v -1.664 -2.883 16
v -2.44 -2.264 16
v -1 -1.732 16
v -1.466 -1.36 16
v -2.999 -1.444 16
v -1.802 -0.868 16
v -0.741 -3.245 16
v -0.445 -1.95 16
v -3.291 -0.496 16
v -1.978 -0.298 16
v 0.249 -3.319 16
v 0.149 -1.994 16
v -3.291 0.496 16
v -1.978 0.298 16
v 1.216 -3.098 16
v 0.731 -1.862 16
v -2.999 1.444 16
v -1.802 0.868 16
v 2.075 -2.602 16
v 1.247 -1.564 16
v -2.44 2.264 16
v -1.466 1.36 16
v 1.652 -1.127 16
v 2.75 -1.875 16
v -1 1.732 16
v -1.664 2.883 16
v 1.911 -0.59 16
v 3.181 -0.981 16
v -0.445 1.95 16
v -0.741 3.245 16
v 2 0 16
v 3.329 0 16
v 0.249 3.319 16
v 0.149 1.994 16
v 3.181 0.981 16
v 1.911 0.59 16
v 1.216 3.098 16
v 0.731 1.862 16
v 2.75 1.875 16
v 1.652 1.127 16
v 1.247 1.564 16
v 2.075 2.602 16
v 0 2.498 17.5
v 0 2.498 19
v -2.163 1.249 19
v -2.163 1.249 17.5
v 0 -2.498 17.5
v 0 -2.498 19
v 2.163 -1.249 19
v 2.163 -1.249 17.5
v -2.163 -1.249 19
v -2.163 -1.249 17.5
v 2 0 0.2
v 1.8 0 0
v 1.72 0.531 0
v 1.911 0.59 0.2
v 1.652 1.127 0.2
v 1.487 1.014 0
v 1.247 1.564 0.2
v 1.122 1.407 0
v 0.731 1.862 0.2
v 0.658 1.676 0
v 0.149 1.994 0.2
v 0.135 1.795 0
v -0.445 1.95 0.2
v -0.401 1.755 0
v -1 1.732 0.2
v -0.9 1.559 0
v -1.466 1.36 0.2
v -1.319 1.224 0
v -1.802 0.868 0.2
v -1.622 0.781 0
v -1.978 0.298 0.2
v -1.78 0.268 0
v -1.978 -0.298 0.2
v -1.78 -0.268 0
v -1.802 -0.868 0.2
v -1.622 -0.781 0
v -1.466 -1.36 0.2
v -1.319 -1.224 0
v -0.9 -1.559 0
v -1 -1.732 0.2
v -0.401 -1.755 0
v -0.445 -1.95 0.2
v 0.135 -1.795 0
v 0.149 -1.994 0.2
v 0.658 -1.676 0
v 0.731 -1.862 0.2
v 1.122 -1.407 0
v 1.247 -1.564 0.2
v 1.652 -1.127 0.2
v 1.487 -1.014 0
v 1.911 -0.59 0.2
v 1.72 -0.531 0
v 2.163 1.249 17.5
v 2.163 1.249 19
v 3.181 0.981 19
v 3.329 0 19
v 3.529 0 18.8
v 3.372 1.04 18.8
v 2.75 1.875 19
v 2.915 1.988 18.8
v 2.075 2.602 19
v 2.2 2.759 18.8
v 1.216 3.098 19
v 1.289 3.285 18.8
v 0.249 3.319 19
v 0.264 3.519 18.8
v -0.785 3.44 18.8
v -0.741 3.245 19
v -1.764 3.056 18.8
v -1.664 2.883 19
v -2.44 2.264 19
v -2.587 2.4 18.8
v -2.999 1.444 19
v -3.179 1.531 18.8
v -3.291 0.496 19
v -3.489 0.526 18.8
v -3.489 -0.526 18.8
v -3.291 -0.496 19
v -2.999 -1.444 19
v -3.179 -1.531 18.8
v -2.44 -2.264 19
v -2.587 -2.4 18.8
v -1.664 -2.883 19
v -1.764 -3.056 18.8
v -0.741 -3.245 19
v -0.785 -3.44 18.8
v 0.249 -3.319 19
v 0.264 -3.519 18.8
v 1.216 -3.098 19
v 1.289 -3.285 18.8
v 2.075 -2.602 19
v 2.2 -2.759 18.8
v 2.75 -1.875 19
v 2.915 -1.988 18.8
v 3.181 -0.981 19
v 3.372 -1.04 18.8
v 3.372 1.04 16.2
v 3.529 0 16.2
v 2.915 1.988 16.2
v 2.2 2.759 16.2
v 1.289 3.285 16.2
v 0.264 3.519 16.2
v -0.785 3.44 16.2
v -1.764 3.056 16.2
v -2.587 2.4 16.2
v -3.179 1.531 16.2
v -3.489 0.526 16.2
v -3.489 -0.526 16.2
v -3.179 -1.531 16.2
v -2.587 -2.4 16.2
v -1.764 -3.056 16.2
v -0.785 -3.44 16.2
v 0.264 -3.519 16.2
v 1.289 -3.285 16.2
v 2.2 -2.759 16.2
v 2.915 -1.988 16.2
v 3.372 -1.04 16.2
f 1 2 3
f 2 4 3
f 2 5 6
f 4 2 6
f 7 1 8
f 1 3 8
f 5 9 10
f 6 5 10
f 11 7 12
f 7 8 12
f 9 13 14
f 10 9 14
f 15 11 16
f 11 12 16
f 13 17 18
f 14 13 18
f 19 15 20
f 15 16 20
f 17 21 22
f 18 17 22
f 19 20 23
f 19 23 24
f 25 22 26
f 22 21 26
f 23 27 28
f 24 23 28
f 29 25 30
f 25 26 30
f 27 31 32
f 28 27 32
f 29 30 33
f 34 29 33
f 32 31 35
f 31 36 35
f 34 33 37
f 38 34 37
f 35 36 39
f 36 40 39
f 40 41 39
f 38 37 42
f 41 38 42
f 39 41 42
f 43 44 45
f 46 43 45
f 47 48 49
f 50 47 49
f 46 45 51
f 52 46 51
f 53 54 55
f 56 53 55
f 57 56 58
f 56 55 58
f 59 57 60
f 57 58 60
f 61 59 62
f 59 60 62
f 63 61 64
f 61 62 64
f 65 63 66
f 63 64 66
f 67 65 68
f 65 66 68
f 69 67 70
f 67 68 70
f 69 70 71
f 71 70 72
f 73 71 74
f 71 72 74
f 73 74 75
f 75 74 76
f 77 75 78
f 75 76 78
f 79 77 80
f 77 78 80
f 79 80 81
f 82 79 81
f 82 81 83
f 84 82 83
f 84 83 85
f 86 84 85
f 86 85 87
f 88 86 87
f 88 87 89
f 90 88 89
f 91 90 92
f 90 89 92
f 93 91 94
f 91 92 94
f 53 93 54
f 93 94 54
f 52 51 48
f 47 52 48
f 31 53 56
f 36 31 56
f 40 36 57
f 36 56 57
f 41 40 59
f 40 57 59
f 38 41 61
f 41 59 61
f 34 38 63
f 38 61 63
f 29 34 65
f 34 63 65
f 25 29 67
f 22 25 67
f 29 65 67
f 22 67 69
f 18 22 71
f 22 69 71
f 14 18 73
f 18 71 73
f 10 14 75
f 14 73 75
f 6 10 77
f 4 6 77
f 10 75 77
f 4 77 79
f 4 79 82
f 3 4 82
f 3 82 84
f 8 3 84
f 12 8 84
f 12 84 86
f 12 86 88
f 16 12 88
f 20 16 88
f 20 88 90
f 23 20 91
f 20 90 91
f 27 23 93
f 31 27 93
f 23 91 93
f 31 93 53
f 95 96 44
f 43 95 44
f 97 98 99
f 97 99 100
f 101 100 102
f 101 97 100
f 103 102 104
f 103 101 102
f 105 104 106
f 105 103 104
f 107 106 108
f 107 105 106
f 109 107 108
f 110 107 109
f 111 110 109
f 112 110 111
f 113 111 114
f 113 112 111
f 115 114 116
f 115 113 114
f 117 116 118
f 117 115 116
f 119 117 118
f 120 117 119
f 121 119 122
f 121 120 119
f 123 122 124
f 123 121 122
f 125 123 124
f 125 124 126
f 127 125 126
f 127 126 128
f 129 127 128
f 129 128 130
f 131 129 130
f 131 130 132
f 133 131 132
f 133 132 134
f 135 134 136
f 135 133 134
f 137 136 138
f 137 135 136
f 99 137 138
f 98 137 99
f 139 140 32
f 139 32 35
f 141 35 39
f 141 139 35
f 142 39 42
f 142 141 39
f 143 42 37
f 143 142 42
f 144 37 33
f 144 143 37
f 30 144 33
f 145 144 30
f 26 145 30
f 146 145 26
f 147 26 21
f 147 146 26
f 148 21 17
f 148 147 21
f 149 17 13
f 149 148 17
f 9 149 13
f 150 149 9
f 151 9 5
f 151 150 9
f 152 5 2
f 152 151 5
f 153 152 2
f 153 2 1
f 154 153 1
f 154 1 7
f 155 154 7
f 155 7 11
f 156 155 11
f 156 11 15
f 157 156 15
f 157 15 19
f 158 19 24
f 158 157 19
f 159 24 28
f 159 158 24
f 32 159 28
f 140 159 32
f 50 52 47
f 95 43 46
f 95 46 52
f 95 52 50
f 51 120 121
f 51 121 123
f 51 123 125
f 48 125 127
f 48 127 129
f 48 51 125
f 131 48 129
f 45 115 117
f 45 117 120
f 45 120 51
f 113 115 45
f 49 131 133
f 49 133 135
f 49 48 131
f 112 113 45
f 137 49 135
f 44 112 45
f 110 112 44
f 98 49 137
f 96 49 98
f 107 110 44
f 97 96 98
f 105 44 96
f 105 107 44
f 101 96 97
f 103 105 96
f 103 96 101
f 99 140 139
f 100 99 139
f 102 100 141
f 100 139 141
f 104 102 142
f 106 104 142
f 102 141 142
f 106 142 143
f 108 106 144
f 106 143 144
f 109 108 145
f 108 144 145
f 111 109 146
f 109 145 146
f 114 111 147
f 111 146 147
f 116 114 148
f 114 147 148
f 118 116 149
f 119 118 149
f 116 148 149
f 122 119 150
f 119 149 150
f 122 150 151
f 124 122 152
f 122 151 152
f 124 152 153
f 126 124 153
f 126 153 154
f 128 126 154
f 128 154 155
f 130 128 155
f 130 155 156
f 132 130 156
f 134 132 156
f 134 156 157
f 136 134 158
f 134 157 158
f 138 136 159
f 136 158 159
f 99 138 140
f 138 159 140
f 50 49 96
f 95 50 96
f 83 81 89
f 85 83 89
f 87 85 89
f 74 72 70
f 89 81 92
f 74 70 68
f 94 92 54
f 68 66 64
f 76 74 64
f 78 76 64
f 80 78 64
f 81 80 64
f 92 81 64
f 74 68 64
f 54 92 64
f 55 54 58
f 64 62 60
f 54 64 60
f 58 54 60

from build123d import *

# Parameters (mm, degrees)
SKETCH_1_R          = 2
EXTRUDE_1_DEPTH     = 16
SKETCH_2_R          = 3.52854217
EXTRUDE_3_DEPTH     = 3
CUT_EXTRUDE_2_DEPTH = 1.5
CHAMFER_1_SIZE      = 0.2
CHAMFER_2_SIZE      = 0.2


with BuildPart() as part:
    # 草图1 → 凸台-拉伸1 (new body)
    with BuildSketch(Plane.XY):
        Circle(SKETCH_1_R)
    extrude(amount=EXTRUDE_1_DEPTH)

    # 草图2 → 凸台-拉伸3 (add)
    with BuildSketch(Plane.XY.offset(16)):
        Circle(SKETCH_2_R)
    extrude(amount=EXTRUDE_3_DEPTH)

    # 草图3 → 切除-拉伸2 (cut)
    with BuildSketch(Plane.XY.offset(19)):
        Polygon((0, 2.497687594), (-2.163060907, 1.248843797), (-2.163060907, -1.248843797), (0, -2.497687594), (2.163060907, -1.248843797), (2.163060907, 1.248843797), align=None)
    extrude(amount=-CUT_EXTRUDE_2_DEPTH, mode=Mode.SUBTRACT)

    # 倒角1
    chamfer_1_edges = [part.edges().sort_by_distance(p)[0] for p in [
        (-2, 0, 0),
    ]]
    chamfer(chamfer_1_edges, length=CHAMFER_1_SIZE)

    # 倒角2
    chamfer_2_edges = [part.edges().sort_by_distance(p)[0] for p in [
        (-3.52854217, 0, 16),
        (-3.52854217, 0, 19),
    ]]
    chamfer(chamfer_2_edges, length=CHAMFER_2_SIZE)


solid = part.part
